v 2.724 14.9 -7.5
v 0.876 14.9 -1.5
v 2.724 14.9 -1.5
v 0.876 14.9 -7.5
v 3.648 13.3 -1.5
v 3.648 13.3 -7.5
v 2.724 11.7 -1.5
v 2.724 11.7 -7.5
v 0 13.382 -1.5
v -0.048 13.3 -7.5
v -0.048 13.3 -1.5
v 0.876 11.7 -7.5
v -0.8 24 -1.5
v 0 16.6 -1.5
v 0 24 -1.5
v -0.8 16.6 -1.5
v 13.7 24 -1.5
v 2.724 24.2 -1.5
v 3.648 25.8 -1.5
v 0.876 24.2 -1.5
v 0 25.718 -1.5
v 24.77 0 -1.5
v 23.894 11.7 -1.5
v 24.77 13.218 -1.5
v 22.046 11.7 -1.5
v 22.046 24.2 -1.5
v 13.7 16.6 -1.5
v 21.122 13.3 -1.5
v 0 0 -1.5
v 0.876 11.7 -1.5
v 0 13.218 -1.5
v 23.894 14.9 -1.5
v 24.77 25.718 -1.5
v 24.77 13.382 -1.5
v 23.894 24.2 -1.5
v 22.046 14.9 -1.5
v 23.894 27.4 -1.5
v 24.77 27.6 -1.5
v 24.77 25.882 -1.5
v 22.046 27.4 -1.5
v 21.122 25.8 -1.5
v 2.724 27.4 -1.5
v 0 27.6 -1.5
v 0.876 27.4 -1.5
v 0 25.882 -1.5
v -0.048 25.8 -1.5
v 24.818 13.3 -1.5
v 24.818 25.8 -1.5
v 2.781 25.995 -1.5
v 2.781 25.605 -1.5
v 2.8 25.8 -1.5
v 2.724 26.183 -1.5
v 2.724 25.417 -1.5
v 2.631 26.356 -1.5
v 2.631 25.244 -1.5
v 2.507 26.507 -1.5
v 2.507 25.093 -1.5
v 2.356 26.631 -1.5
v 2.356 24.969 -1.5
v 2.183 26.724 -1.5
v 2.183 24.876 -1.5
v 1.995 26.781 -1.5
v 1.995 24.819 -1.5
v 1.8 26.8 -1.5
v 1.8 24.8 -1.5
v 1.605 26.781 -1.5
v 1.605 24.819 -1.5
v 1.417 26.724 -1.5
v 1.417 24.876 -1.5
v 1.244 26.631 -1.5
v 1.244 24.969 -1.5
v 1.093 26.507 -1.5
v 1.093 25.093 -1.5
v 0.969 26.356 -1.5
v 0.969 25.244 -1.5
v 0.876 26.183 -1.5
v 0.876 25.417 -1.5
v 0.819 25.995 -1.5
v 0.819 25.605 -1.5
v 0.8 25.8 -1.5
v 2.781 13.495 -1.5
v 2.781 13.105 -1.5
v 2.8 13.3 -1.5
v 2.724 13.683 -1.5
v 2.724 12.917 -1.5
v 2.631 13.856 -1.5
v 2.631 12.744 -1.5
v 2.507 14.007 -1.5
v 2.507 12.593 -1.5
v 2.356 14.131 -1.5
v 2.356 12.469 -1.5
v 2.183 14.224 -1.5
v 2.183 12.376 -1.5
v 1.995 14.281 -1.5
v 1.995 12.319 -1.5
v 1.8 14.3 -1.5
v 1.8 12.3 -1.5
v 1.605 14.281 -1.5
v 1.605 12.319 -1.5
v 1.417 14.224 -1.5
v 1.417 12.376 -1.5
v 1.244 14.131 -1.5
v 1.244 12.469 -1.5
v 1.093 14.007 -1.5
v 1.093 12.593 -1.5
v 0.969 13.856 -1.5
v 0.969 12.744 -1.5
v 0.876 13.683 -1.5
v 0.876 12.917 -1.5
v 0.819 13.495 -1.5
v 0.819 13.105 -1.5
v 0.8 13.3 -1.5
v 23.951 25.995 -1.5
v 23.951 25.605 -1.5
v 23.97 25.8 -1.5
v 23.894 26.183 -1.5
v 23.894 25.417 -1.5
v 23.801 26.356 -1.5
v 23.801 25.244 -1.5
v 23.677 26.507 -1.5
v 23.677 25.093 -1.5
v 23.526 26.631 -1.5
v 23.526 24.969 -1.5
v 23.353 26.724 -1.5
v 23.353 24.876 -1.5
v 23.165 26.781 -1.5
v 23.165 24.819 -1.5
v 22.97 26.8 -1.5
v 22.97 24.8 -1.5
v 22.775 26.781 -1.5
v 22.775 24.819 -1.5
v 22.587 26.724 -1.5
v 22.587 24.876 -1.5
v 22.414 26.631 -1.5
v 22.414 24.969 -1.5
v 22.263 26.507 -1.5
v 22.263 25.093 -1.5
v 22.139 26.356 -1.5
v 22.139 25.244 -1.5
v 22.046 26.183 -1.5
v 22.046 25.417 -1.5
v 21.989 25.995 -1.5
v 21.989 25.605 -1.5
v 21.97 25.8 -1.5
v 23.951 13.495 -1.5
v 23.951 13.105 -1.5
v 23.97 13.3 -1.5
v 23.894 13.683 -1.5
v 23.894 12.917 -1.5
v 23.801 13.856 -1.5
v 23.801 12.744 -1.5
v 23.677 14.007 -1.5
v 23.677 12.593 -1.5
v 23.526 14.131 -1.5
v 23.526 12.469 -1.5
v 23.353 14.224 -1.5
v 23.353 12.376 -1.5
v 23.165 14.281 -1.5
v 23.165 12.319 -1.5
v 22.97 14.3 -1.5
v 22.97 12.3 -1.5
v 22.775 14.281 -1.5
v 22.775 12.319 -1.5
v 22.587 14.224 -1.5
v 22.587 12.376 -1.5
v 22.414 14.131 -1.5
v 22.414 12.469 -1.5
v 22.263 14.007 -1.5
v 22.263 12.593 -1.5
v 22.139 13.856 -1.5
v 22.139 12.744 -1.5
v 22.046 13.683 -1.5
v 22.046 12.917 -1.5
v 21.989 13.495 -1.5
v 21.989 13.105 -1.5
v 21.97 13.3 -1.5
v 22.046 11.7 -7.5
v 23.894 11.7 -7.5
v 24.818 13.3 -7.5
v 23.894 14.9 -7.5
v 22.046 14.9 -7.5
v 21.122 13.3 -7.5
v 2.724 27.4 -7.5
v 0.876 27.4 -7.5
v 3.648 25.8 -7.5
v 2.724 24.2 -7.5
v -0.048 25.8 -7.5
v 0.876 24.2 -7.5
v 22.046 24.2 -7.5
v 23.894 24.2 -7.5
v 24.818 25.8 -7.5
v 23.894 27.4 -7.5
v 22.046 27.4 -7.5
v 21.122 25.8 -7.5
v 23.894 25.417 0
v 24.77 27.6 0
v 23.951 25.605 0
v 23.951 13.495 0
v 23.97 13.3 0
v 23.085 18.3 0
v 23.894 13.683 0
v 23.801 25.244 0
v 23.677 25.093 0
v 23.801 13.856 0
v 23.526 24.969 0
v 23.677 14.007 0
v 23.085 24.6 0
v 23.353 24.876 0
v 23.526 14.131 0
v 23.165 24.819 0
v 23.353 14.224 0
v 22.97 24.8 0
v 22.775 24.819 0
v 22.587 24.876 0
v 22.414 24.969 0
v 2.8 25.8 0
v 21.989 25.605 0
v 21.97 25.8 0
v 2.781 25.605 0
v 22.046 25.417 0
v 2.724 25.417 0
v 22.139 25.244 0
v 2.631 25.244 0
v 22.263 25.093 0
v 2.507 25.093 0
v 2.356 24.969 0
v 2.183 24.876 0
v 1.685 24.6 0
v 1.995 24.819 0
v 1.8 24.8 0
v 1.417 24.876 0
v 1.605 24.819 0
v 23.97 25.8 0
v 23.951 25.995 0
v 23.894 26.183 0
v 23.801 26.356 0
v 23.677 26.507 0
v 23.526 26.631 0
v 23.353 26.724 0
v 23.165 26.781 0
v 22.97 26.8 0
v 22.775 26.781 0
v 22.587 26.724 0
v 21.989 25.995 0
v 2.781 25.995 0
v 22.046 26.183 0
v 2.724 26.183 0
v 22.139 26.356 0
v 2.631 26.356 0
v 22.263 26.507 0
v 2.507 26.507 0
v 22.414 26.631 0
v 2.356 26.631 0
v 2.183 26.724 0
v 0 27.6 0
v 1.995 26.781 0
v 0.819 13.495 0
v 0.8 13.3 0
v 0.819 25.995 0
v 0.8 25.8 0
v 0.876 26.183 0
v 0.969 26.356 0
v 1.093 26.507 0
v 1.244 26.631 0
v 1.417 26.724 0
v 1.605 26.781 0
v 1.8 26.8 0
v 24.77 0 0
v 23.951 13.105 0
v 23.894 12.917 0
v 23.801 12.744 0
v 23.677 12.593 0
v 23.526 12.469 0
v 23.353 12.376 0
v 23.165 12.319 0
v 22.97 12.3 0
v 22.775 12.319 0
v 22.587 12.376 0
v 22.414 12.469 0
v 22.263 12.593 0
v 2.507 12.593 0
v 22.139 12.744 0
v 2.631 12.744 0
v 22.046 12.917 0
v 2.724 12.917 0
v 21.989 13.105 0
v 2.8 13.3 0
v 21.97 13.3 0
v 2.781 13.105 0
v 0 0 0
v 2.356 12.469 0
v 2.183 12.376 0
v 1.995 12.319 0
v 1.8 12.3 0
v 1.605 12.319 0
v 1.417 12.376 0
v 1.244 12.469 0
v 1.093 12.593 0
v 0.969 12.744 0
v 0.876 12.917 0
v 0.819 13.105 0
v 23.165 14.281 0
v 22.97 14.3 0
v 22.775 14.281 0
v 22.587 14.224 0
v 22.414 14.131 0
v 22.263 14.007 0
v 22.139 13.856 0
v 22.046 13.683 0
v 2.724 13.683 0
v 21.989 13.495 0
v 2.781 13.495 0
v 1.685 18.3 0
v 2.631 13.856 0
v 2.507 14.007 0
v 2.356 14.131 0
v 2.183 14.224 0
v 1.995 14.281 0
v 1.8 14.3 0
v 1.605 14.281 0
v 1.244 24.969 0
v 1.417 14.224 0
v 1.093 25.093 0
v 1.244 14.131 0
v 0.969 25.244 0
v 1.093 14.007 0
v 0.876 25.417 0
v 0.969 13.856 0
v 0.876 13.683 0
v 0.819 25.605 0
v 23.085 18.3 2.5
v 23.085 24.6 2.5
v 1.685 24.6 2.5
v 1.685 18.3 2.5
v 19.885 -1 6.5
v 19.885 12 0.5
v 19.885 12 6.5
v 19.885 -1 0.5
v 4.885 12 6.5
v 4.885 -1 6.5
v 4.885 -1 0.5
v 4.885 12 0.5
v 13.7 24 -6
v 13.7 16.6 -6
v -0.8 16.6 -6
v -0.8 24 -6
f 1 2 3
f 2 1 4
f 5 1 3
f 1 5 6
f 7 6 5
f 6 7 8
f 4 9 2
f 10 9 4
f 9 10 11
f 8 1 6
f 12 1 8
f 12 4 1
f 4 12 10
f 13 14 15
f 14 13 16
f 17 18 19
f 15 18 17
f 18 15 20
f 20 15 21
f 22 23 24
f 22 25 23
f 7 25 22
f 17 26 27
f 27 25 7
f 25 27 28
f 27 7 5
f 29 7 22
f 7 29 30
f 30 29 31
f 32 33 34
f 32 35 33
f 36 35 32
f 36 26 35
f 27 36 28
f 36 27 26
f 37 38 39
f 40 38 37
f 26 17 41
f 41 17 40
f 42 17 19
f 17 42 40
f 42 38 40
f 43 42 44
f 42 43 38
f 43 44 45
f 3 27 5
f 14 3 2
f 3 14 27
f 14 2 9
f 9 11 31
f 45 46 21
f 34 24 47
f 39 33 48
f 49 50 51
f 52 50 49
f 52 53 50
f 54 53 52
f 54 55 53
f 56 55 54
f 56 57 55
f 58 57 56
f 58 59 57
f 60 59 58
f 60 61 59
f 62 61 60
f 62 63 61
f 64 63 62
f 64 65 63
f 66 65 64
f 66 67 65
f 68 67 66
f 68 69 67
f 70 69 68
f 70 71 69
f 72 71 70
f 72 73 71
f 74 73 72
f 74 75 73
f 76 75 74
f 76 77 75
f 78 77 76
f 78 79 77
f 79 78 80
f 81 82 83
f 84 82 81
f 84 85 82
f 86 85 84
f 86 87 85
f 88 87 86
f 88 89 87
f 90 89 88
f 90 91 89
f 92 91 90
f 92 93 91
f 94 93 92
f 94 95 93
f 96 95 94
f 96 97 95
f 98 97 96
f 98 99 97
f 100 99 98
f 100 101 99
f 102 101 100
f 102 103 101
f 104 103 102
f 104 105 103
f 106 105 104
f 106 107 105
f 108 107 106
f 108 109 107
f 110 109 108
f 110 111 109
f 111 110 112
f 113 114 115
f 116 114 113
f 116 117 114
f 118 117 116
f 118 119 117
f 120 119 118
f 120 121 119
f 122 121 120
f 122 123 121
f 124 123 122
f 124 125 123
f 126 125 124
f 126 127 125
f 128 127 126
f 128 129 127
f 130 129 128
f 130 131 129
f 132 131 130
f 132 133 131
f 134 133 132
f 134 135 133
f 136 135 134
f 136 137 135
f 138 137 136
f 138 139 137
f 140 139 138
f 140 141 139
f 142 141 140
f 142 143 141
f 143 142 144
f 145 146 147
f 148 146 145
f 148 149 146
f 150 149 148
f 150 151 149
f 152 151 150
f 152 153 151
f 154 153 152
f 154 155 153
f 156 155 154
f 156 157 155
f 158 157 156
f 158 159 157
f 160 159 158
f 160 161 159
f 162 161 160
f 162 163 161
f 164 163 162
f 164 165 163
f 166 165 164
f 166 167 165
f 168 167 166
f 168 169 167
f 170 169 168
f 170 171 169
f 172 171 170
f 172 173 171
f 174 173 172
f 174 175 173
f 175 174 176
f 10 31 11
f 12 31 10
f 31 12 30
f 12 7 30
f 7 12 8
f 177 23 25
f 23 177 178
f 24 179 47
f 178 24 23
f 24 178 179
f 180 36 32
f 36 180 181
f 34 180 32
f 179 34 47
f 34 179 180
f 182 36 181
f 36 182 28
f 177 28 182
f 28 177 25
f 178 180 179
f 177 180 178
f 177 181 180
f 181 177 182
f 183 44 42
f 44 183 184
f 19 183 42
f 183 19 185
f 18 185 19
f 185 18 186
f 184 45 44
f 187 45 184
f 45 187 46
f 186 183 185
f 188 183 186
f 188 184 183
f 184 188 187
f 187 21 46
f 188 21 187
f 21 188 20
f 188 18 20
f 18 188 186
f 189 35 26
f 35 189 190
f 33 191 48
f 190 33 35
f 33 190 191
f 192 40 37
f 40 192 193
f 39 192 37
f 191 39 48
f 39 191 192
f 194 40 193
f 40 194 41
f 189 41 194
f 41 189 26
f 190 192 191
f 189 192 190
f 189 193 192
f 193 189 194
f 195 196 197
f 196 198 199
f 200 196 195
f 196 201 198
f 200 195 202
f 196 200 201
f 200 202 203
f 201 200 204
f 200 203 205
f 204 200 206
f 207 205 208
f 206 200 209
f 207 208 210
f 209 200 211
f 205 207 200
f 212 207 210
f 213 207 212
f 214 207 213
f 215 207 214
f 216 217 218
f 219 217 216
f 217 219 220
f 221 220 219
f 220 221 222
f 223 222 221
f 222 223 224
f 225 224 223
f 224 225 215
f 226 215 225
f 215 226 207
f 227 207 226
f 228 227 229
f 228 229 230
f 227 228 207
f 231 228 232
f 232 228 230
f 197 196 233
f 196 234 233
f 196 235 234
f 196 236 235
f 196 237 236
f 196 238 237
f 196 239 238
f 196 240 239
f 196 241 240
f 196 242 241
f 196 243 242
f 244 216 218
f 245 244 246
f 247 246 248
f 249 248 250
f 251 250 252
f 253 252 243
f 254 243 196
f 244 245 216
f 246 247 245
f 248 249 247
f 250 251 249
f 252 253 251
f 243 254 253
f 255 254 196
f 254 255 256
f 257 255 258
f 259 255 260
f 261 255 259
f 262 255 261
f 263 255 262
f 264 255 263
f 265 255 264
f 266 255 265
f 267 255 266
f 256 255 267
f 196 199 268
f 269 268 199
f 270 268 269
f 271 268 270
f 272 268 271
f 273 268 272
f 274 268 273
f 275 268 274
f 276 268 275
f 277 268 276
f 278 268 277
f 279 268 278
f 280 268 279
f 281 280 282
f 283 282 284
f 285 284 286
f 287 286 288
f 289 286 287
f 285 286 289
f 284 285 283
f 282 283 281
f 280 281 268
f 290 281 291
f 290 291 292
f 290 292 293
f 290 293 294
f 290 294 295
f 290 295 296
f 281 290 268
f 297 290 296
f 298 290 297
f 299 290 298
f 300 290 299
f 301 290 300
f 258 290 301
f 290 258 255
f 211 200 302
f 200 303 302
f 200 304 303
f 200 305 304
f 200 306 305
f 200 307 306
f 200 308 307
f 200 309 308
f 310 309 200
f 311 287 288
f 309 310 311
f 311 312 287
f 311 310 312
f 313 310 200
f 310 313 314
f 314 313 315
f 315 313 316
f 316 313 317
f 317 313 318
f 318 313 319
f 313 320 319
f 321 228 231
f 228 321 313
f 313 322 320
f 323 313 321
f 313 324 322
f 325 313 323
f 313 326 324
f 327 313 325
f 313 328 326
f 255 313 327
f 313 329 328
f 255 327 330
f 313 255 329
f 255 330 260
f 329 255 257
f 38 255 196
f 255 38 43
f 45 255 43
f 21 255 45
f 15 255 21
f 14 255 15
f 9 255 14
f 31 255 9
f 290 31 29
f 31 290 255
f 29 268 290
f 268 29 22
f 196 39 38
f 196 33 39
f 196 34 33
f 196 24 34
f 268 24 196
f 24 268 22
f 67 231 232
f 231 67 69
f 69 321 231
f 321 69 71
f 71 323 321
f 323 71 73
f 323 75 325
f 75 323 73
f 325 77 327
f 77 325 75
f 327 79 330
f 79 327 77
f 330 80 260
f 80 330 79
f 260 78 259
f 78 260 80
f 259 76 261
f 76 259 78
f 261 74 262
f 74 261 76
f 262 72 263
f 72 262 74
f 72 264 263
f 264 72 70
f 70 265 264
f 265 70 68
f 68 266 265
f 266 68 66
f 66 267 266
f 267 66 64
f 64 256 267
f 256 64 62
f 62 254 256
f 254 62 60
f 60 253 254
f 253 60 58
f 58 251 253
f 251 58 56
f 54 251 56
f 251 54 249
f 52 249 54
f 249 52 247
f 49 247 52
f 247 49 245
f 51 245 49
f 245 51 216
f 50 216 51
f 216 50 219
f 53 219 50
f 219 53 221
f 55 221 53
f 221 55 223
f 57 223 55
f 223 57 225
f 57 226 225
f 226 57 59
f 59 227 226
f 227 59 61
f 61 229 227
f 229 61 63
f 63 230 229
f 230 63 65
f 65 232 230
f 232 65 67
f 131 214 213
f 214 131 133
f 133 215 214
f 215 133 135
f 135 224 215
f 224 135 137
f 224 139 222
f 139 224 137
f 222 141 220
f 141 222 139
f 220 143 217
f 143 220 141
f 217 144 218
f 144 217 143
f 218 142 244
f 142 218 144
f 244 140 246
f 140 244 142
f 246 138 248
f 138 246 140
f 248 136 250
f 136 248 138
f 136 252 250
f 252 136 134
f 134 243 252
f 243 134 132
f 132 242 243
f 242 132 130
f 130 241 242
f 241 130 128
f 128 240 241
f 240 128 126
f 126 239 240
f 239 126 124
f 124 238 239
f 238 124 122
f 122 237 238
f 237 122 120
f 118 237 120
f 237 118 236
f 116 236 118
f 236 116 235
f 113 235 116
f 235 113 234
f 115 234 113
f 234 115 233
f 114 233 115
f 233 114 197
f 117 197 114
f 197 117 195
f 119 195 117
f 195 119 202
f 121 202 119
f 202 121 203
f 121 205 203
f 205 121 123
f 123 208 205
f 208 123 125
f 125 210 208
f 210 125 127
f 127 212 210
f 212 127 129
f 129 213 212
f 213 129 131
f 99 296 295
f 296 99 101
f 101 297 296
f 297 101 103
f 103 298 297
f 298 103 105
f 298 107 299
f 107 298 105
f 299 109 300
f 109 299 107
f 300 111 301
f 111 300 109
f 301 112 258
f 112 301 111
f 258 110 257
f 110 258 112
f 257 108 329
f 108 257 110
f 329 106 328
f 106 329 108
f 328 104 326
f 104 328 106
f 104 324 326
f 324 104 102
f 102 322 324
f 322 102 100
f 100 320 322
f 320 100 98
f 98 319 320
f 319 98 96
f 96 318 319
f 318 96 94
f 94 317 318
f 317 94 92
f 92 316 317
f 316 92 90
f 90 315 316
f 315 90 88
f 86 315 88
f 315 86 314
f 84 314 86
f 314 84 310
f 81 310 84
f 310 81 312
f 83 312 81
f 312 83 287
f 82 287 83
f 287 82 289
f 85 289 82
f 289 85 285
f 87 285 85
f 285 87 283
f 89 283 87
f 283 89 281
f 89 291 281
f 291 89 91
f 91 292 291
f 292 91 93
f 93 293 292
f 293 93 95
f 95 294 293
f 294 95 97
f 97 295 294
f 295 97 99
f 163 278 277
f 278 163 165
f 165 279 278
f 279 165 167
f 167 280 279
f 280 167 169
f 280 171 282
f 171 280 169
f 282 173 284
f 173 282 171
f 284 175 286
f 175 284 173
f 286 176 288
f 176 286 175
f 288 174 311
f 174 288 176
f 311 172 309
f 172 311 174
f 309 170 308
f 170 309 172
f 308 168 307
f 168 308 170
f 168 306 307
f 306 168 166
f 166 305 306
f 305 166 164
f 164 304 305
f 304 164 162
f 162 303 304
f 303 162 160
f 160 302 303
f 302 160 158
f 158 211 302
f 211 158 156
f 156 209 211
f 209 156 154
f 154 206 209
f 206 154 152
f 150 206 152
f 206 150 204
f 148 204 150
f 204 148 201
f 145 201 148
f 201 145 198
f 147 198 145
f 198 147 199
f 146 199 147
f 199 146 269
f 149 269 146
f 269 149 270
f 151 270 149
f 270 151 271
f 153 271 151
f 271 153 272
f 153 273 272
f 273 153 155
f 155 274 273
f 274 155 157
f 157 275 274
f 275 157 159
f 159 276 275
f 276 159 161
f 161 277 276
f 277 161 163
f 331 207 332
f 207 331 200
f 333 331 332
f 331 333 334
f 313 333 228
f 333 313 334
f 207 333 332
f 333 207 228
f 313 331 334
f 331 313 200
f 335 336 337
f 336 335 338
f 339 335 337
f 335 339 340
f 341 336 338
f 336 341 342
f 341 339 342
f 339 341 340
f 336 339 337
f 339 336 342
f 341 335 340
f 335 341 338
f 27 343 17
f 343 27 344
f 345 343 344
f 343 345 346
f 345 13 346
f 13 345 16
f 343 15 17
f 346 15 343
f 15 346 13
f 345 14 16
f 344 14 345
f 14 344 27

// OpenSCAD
// uc392.scad
// Reference model of the UC-392 CSI-to-HDMI adapter board (one of the two identical
// boards in the CSI-HDMI extension kit). Mounts are designed around this.
//
// Measured by the user with a micrometer (2026-10-21) unless marked (est); (est)
// values were scaled off photos.
//
// Axes (viewed from the front, the side with both sockets):
//   X = across the board, 0 = left edge (the P1 / A / B / C / GND pad row)
//   Y = along the board, 0 = HDMI end; the ribbon socket is at the far end (+Y)
//   Z = out of the front face; the PCB is z -1.5..0, the back is z < -1.5
//
// Preview:  openscad -o uc392.png --render --viewall --autocenter \
//             --imgsize=950,850 --colorscheme=Tomorrow uc392.scad

$fn = 32;

/* ---------- Board ---------- */
uc_w = 24.77;    // X
uc_l = 27.6;     // Y
uc_t = 1.5;

// Holes: kit hardware is ~M1.7. The user gave edge GAPS (hole edge to board edge).
uc_hole_d   = 2.0;     // (est) M1.7 clearance
uc_hole_gap = 0.8;     // hole edge to the side / ribbon-end edges
uc_hole_mid = 12.3;    // middle holes: hole edge to the HDMI-end edge (CONFIRM which end)
uc_hx  = [uc_hole_gap + uc_hole_d/2, uc_w - uc_hole_gap - uc_hole_d/2];
uc_hy  = [uc_hole_mid + uc_hole_d/2, uc_l - uc_hole_gap - uc_hole_d/2];
uc_holes = [for (y = uc_hy, x = uc_hx) [x, y]];

/* ---------- Front ---------- */
// 15-pin FPC socket, centred, near the ribbon end; ribbon leaves the +Y edge
fpc_w  = 21.4;   // (est)
fpc_y0 = uc_l - 9.3;   // (est)
fpc_d  = 6.3;    // (est) along Y
fpc_h  = 2.5;
// HDMI type A receptacle, centred, sticking out past the HDMI end
hdmi_w     = 15;
hdmi_h     = 6.0;    // (est) standard type-A receptacle height
hdmi_l     = 13.0;   // (est) along Y, from its mouth
hdmi_out   = 1.0;    // (est) mouth past the board edge
hdmi_z0    = 0.5;    // "less than a mm" off the board

/* ---------- Back ---------- */
// The black jack (P3) on the back, at the ribbon end on the P1 side, overhanging that edge
jack_h   = 4.5;
jack_x   = [-0.8, 13.7];        // (est)
jack_y   = [uc_l - 11, uc_l - 3.6];   // (est) clear of the corner hole's riser

/* ---------- Kit riser (standoff) ---------- */
riser_h  = 6;
riser_af = 3.2;   // (est) across flats

// Accessors for files that `use` this one (variables don't cross `use`)
function uc392_size()    = [uc_w, uc_l, uc_t];
function uc392_holes()   = uc_holes;
function uc392_riser_h() = riser_h;
function uc392_fpc()     = [fpc_y0, fpc_d, fpc_h];   // socket start, depth along Y, height

module uc392(show_risers = true) {
    color("ForestGreen") translate([0, 0, -uc_t]) linear_extrude(uc_t) difference() {
        square([uc_w, uc_l]);
        for (h = uc_holes) translate(h) circle(d = uc_hole_d);
    }
    color("Silver") translate([(uc_w - fpc_w)/2, fpc_y0, 0]) cube([fpc_w, fpc_d, fpc_h]);
    color("Gold") translate([(uc_w - hdmi_w)/2, -hdmi_out, hdmi_z0]) cube([hdmi_w, hdmi_l, hdmi_h]);
    color("Black") translate([jack_x[0], jack_y[0], -uc_t - jack_h])
        cube([jack_x[1] - jack_x[0], jack_y[1] - jack_y[0], jack_h]);
    if (show_risers) color("Goldenrod") for (h = uc_holes)
        translate([h[0], h[1], -uc_t - riser_h]) cylinder(d = riser_af / cos(30), h = riser_h, $fn = 6);
}

// HDMI plug + cable boot, for clearance checks (standard type A plug, est)
module uc392_hdmi_plug(len = 40)
    color("DimGray") translate([(uc_w - 21)/2, -hdmi_out - len, hdmi_z0 + hdmi_h/2 - 5.5]) cube([21, len, 11]);

// 15-pin ribbon leaving the ribbon end
module uc392_ribbon(len = 20)
    color("Orange", 0.7) translate([(uc_w - 16)/2, fpc_y0 + fpc_d/2, fpc_h/2]) cube([16, fpc_d/2 + len, 0.3]);

uc392();
